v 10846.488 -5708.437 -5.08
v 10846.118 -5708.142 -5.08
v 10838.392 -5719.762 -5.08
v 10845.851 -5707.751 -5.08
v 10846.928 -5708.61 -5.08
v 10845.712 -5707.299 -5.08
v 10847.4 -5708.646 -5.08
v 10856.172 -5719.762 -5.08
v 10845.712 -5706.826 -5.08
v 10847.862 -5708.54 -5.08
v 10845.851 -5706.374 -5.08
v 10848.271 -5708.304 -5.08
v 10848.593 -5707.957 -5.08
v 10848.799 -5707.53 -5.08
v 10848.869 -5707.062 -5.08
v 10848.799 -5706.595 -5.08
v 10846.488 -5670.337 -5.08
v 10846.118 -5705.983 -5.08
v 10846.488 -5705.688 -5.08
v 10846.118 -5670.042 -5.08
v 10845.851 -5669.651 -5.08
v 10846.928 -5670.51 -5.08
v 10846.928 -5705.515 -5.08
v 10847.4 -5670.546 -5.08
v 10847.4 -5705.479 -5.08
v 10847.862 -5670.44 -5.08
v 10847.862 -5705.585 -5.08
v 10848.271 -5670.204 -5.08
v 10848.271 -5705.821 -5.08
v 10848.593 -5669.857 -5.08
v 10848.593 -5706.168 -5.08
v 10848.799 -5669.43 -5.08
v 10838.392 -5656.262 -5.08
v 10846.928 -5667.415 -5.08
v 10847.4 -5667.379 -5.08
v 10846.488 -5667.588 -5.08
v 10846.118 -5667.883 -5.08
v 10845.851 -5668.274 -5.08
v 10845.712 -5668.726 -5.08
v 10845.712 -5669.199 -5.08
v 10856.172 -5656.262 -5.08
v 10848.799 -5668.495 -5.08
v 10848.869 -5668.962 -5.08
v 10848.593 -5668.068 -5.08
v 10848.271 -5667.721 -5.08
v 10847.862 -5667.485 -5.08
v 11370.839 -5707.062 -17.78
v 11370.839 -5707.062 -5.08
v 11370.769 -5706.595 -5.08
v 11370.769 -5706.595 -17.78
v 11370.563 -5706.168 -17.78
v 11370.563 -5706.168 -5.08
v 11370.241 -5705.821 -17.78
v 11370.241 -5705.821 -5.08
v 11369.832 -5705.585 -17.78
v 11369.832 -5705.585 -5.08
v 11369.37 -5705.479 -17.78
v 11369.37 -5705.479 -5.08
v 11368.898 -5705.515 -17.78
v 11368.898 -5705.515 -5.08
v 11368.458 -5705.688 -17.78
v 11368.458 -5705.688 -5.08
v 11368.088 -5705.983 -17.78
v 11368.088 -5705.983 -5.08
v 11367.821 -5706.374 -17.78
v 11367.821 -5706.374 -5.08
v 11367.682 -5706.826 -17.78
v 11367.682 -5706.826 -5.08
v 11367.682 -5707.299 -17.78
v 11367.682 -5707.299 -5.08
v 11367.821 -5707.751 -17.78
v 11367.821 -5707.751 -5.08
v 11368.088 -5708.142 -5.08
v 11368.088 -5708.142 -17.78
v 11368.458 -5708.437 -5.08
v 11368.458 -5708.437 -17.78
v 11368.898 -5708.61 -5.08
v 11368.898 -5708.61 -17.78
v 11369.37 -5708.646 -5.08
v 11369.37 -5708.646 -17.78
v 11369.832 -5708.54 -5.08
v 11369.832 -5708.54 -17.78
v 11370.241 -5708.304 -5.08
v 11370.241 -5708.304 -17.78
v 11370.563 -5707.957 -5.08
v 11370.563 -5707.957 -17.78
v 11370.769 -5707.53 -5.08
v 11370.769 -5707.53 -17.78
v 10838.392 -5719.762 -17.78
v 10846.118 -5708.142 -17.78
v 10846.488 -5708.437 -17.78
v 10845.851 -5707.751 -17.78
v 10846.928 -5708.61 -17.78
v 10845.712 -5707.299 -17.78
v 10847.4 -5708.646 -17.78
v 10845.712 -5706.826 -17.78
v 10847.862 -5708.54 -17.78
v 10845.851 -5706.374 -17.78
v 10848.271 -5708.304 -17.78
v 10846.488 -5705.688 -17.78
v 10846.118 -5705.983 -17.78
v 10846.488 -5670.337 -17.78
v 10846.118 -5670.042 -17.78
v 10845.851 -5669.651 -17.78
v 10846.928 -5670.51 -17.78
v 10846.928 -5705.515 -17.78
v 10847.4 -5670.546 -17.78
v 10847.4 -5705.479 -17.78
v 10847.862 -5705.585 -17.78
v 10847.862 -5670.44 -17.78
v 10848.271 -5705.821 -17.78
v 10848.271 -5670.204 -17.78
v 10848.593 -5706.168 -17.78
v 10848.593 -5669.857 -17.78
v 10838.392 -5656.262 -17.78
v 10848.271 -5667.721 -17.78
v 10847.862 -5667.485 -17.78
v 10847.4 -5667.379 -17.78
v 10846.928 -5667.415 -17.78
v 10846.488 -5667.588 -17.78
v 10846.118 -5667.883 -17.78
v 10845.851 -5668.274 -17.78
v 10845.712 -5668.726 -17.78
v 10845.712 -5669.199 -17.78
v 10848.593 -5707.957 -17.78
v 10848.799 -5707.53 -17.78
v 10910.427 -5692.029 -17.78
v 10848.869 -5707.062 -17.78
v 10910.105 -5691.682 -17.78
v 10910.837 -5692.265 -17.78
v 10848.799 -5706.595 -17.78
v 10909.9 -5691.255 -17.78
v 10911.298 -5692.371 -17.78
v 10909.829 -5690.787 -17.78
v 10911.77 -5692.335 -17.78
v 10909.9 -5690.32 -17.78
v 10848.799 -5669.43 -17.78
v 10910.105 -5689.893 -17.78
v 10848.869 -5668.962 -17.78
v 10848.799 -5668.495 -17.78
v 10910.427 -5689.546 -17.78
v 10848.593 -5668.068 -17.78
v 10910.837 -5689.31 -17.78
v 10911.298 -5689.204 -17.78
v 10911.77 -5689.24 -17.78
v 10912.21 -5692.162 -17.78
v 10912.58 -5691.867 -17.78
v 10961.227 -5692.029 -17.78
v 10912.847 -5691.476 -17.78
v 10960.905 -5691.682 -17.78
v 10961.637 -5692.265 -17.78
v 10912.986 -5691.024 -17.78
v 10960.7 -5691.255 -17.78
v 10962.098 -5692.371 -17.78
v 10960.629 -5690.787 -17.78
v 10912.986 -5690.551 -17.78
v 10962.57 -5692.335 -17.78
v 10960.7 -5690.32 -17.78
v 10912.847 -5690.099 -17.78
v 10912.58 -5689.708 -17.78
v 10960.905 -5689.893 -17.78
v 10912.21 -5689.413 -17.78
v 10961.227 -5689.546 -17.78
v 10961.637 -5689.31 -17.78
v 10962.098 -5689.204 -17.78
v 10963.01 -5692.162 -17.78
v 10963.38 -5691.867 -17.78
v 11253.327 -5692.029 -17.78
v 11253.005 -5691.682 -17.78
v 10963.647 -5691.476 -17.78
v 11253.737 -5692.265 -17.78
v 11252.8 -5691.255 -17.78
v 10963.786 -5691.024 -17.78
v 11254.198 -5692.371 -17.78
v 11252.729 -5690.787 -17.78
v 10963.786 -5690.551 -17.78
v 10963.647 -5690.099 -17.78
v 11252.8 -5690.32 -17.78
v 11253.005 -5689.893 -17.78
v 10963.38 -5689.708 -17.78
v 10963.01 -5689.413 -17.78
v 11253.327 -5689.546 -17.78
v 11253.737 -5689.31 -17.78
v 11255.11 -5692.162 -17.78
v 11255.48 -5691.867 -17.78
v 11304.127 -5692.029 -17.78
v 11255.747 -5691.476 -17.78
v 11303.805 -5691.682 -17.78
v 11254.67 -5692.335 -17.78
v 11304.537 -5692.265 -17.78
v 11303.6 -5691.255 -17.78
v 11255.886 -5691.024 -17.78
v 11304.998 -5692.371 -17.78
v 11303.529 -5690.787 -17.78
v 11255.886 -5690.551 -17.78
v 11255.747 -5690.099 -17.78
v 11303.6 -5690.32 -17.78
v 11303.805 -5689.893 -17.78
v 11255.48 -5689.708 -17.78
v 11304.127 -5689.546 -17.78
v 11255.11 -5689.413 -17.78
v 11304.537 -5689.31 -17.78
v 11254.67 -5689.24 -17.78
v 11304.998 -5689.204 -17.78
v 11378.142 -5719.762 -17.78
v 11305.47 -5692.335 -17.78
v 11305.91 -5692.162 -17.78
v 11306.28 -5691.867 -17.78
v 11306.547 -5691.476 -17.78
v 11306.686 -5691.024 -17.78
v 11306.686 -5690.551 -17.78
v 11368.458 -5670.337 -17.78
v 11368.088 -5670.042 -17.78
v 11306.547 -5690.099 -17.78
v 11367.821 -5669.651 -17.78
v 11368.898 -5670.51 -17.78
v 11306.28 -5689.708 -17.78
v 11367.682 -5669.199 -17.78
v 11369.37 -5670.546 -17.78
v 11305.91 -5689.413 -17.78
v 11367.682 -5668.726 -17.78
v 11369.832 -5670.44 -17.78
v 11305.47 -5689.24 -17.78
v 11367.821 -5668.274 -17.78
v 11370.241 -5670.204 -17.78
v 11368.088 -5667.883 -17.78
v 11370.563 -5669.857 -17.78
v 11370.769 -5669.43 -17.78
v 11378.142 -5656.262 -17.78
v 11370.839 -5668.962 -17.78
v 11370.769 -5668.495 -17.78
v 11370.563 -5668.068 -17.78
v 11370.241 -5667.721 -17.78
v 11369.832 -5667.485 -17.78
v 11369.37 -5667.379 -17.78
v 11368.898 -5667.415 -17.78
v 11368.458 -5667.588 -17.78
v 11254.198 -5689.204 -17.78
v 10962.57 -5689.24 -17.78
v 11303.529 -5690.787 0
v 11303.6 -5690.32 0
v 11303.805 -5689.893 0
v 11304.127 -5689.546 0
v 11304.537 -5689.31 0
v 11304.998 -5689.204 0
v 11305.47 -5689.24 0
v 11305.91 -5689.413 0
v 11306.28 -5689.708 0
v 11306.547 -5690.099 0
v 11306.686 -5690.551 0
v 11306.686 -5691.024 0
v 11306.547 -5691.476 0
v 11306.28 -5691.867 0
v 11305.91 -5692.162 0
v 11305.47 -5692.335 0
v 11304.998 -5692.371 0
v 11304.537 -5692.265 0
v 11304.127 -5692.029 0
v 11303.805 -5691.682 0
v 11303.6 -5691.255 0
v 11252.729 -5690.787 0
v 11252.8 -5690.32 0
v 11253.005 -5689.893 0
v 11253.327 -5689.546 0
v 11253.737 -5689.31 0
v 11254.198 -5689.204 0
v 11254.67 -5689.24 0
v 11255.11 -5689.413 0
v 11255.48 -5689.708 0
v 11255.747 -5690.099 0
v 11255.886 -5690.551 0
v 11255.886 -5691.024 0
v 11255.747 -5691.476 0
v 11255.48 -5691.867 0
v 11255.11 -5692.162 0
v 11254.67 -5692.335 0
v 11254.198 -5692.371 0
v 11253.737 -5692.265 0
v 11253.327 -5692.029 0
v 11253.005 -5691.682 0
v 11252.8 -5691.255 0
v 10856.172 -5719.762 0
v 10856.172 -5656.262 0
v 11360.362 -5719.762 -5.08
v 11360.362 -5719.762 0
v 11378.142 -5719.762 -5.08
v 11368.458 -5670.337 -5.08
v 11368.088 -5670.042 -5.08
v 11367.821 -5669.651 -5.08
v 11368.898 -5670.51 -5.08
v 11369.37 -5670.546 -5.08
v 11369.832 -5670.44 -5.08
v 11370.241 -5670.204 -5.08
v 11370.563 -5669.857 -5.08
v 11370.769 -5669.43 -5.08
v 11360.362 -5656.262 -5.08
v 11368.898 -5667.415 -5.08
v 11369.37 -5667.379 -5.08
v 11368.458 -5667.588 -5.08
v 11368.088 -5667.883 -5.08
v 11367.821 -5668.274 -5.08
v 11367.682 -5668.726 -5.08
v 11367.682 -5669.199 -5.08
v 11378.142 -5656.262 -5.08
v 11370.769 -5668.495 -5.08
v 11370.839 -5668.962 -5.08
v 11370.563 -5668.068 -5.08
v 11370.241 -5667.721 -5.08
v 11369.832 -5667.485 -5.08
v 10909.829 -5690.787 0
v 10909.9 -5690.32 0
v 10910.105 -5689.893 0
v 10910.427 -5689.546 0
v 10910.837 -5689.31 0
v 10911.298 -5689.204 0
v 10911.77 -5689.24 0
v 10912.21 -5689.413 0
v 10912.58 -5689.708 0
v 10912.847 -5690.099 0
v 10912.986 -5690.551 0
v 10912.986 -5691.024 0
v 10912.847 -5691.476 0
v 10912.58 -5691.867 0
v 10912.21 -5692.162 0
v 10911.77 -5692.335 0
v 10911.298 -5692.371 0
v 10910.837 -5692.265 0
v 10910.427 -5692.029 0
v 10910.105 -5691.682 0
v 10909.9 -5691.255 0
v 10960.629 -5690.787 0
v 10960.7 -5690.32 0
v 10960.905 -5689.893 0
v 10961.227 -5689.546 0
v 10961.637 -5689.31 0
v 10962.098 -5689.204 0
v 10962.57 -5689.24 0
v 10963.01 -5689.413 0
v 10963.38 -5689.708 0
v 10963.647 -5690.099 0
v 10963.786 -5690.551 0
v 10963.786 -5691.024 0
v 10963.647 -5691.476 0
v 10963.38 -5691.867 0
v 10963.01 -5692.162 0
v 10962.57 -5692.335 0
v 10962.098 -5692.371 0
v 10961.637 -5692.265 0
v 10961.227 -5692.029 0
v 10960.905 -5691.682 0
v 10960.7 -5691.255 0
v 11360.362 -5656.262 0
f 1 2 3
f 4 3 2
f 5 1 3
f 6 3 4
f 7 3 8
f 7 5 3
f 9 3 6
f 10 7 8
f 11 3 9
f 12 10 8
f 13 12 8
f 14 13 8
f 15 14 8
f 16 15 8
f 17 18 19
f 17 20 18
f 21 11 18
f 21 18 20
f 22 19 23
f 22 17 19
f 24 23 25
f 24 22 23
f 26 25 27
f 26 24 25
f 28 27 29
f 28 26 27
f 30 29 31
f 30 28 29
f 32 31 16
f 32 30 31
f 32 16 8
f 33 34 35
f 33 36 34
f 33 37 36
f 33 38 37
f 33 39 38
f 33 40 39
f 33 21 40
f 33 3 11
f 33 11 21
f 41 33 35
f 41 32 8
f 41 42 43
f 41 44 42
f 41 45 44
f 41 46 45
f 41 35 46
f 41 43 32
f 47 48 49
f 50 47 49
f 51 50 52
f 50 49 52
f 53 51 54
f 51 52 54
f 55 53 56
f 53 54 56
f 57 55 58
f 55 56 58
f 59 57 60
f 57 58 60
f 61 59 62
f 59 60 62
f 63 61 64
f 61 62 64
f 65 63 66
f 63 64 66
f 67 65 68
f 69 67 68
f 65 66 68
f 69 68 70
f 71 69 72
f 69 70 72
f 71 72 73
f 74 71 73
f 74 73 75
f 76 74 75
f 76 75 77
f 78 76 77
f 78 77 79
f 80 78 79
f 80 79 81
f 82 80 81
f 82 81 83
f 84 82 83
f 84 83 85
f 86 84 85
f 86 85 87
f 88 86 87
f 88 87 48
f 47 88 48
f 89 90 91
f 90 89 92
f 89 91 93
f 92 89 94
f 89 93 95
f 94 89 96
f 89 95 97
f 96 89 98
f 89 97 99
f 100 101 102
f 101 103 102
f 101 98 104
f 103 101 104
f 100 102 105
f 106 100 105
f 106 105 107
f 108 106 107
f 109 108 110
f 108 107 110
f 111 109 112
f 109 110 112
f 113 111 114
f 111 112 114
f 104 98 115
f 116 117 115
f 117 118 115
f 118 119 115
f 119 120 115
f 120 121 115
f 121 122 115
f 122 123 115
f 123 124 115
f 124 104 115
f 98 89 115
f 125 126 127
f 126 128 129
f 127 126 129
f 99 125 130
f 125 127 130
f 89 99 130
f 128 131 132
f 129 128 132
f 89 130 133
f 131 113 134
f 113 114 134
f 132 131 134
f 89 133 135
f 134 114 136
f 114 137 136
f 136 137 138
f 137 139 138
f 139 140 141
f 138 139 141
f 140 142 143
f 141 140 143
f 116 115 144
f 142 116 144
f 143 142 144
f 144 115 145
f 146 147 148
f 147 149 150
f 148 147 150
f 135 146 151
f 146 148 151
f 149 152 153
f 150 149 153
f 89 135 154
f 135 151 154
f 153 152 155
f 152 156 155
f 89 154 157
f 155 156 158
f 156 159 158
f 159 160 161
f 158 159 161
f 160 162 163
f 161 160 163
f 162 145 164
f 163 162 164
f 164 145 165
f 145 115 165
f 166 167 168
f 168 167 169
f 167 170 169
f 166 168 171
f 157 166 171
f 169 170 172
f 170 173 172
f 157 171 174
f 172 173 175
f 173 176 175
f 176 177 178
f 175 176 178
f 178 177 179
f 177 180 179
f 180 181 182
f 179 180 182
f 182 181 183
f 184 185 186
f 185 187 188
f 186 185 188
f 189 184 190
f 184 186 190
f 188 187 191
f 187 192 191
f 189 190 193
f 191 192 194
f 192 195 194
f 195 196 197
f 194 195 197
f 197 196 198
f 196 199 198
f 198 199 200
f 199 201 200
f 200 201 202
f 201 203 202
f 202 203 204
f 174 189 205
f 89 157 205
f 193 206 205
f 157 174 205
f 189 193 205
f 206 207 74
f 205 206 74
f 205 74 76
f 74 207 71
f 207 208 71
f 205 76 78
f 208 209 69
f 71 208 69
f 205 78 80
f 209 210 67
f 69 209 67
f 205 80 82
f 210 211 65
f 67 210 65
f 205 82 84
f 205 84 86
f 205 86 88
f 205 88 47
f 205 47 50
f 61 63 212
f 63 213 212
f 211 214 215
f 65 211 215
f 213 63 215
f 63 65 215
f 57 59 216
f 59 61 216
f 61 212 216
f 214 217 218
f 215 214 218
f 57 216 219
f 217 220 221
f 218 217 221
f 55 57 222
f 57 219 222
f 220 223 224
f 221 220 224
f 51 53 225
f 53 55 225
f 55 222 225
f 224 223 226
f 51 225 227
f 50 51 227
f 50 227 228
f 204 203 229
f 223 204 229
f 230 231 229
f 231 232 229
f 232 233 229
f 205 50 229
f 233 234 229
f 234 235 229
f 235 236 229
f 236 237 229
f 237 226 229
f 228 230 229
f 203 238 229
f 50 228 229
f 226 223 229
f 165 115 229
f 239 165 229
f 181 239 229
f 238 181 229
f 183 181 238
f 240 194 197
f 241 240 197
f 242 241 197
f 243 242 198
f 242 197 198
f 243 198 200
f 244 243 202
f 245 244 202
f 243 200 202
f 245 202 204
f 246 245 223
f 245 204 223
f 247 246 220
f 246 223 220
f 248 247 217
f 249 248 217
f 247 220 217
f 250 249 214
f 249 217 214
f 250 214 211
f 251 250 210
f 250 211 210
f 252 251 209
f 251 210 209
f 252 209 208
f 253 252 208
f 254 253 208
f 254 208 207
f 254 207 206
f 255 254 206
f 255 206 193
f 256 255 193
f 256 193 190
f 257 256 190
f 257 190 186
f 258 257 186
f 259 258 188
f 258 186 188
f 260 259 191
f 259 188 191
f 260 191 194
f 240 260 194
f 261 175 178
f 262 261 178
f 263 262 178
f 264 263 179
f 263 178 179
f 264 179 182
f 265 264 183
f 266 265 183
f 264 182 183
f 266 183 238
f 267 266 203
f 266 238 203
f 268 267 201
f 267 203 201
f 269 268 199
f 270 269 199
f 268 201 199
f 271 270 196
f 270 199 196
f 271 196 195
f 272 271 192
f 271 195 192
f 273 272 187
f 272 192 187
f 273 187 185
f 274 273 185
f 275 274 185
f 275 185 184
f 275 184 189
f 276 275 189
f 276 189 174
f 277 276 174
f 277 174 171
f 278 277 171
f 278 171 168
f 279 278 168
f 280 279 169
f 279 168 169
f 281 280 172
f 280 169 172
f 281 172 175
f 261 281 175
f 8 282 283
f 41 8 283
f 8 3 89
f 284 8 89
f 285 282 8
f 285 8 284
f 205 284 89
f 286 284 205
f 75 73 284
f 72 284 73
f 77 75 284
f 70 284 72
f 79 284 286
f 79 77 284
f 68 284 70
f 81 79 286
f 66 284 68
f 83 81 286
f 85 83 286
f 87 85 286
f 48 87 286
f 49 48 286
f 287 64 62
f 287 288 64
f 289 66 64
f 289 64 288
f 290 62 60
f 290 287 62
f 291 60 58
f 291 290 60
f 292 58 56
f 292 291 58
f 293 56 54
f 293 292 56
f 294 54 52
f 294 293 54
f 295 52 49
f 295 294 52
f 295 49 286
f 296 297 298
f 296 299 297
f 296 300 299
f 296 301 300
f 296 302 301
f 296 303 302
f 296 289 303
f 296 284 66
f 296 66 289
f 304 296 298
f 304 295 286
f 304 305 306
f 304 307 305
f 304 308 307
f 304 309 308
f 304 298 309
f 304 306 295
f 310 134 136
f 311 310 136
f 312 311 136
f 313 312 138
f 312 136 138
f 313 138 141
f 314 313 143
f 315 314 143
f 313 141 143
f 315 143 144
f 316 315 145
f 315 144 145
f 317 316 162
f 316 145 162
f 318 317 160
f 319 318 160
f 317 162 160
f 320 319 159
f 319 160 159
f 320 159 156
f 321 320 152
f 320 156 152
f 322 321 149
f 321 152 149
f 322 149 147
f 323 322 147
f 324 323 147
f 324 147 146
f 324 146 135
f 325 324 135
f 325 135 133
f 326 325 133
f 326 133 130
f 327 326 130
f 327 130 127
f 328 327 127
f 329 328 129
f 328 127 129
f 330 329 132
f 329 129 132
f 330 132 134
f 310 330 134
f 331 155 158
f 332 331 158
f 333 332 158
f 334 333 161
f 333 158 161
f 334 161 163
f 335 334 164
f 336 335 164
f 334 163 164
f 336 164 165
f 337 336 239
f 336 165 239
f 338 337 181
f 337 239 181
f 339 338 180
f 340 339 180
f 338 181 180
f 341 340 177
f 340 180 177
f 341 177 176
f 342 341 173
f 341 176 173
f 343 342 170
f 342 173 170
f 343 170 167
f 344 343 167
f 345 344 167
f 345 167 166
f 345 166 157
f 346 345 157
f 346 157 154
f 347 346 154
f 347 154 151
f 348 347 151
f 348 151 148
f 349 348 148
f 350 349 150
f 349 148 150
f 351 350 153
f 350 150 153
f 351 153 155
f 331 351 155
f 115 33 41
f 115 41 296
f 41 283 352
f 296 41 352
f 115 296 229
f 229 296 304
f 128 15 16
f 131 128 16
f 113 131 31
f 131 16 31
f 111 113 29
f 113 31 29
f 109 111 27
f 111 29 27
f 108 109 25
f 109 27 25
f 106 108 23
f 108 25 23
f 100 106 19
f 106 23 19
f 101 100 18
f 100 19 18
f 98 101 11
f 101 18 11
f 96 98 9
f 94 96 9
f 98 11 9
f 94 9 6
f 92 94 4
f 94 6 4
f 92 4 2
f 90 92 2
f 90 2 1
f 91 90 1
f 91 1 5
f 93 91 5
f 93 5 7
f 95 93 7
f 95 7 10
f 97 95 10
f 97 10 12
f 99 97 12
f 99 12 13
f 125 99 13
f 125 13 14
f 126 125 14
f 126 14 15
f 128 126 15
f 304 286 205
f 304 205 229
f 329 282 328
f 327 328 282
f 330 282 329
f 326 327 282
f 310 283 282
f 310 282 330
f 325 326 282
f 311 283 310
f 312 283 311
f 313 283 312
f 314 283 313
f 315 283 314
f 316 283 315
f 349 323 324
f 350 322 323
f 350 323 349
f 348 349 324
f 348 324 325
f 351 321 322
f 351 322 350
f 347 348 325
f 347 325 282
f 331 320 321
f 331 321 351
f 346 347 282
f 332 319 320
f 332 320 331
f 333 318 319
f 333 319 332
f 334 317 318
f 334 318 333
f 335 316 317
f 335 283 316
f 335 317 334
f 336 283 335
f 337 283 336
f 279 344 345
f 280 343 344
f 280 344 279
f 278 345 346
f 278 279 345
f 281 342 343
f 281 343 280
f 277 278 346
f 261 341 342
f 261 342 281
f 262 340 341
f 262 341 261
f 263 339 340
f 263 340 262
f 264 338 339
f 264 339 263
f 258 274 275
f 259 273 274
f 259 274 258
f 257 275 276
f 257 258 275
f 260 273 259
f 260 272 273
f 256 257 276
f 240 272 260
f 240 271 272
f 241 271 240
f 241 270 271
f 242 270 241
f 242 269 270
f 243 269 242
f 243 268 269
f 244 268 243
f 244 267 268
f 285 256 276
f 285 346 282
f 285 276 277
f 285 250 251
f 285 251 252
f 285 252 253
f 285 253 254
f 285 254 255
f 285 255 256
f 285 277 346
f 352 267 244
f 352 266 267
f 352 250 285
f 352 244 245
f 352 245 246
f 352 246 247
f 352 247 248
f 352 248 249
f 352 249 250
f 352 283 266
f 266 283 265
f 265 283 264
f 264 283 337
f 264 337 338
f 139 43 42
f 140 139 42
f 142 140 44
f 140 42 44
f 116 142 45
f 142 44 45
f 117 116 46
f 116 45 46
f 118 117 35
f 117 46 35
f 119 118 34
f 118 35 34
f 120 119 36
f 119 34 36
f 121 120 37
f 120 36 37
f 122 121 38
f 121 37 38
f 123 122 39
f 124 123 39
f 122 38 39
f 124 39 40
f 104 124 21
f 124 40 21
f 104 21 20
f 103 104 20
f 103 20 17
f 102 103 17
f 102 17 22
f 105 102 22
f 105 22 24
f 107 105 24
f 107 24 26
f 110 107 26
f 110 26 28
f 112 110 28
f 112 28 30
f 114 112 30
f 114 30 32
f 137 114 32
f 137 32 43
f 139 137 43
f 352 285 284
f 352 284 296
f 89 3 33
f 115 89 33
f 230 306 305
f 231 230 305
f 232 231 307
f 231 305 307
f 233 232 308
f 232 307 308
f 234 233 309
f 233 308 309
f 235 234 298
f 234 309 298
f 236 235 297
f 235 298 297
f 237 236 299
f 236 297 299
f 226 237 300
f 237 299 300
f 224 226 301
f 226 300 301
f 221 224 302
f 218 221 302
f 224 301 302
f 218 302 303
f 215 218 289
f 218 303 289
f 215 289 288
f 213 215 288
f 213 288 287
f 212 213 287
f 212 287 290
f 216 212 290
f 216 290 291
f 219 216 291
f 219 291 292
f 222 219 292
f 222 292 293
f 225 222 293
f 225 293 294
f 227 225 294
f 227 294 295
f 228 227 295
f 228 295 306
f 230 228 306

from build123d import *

# Parameters (mm, degrees)
PEDOUTLINE_W               = 539.75
PEDOUTLINE_H               = 63.5
PEDOUTLINE_THICKNESS_DEPTH = 17.78
PEDLEDGECUTS_W             = 17.78
PEDLEDGECUTS_H             = 63.5
PEDLEDGECUTS_DEPTH_DEPTH   = 5.08
SKETCH4_R                  = 1.5875
CUT_EXTRUDE2_DEPTH         = 17.78
SKETCH5_R                  = 1.5875
CUT_EXTRUDE3_DEPTH         = 17.78


with BuildPart() as part:
    # PedOutline → PedOutline_Thickness (new body)
    with BuildSketch(Plane.XY):
        with Locations((11108.266666666, -5688.0125)):
            Rectangle(PEDOUTLINE_W, PEDOUTLINE_H)
    extrude(amount=-PEDOUTLINE_THICKNESS_DEPTH)

    # PedLedgeCuts → PedLedgeCuts_Depth (cut)
    with BuildSketch(Plane.XY):
        with Locations((11369.251666666, -5688.0125)):
            Rectangle(PEDLEDGECUTS_W, PEDLEDGECUTS_H)
        with Locations((10847.281666666, -5688.0125)):
            Rectangle(PEDLEDGECUTS_W, PEDLEDGECUTS_H)
    extrude(amount=-PEDLEDGECUTS_DEPTH_DEPTH, mode=Mode.SUBTRACT)

    # Sketch4 → Cut-Extrude2 (cut)
    with BuildSketch(Plane.XY):
        with Locations((10847.281666666, -5668.9625)):
            Circle(SKETCH4_R)
        with Locations((10847.281666666, -5707.0625)):
            Circle(SKETCH4_R)
        with Locations((11369.251666666, -5707.0625)):
            Circle(SKETCH4_R)
        with Locations((11369.251666666, -5668.9625)):
            Circle(SKETCH4_R)
    extrude(amount=-CUT_EXTRUDE2_DEPTH, mode=Mode.SUBTRACT)

    # Sketch5 → Cut-Extrude3 (cut)
    with BuildSketch(Plane(origin=(0, 0, -17.78), x_dir=(-1, 0, 0), z_dir=(0, 0, -1))):
        with Locations((-10911.416666665, -5690.78745)):
            Circle(SKETCH5_R)
        with Locations((-10962.216666665, -5690.78745)):
            Circle(SKETCH5_R)
        with Locations((-11254.316666665, -5690.78745)):
            Circle(SKETCH5_R)
        with Locations((-11305.116666665, -5690.78745)):
            Circle(SKETCH5_R)
    extrude(amount=-CUT_EXTRUDE3_DEPTH, mode=Mode.SUBTRACT)


solid = part.part
